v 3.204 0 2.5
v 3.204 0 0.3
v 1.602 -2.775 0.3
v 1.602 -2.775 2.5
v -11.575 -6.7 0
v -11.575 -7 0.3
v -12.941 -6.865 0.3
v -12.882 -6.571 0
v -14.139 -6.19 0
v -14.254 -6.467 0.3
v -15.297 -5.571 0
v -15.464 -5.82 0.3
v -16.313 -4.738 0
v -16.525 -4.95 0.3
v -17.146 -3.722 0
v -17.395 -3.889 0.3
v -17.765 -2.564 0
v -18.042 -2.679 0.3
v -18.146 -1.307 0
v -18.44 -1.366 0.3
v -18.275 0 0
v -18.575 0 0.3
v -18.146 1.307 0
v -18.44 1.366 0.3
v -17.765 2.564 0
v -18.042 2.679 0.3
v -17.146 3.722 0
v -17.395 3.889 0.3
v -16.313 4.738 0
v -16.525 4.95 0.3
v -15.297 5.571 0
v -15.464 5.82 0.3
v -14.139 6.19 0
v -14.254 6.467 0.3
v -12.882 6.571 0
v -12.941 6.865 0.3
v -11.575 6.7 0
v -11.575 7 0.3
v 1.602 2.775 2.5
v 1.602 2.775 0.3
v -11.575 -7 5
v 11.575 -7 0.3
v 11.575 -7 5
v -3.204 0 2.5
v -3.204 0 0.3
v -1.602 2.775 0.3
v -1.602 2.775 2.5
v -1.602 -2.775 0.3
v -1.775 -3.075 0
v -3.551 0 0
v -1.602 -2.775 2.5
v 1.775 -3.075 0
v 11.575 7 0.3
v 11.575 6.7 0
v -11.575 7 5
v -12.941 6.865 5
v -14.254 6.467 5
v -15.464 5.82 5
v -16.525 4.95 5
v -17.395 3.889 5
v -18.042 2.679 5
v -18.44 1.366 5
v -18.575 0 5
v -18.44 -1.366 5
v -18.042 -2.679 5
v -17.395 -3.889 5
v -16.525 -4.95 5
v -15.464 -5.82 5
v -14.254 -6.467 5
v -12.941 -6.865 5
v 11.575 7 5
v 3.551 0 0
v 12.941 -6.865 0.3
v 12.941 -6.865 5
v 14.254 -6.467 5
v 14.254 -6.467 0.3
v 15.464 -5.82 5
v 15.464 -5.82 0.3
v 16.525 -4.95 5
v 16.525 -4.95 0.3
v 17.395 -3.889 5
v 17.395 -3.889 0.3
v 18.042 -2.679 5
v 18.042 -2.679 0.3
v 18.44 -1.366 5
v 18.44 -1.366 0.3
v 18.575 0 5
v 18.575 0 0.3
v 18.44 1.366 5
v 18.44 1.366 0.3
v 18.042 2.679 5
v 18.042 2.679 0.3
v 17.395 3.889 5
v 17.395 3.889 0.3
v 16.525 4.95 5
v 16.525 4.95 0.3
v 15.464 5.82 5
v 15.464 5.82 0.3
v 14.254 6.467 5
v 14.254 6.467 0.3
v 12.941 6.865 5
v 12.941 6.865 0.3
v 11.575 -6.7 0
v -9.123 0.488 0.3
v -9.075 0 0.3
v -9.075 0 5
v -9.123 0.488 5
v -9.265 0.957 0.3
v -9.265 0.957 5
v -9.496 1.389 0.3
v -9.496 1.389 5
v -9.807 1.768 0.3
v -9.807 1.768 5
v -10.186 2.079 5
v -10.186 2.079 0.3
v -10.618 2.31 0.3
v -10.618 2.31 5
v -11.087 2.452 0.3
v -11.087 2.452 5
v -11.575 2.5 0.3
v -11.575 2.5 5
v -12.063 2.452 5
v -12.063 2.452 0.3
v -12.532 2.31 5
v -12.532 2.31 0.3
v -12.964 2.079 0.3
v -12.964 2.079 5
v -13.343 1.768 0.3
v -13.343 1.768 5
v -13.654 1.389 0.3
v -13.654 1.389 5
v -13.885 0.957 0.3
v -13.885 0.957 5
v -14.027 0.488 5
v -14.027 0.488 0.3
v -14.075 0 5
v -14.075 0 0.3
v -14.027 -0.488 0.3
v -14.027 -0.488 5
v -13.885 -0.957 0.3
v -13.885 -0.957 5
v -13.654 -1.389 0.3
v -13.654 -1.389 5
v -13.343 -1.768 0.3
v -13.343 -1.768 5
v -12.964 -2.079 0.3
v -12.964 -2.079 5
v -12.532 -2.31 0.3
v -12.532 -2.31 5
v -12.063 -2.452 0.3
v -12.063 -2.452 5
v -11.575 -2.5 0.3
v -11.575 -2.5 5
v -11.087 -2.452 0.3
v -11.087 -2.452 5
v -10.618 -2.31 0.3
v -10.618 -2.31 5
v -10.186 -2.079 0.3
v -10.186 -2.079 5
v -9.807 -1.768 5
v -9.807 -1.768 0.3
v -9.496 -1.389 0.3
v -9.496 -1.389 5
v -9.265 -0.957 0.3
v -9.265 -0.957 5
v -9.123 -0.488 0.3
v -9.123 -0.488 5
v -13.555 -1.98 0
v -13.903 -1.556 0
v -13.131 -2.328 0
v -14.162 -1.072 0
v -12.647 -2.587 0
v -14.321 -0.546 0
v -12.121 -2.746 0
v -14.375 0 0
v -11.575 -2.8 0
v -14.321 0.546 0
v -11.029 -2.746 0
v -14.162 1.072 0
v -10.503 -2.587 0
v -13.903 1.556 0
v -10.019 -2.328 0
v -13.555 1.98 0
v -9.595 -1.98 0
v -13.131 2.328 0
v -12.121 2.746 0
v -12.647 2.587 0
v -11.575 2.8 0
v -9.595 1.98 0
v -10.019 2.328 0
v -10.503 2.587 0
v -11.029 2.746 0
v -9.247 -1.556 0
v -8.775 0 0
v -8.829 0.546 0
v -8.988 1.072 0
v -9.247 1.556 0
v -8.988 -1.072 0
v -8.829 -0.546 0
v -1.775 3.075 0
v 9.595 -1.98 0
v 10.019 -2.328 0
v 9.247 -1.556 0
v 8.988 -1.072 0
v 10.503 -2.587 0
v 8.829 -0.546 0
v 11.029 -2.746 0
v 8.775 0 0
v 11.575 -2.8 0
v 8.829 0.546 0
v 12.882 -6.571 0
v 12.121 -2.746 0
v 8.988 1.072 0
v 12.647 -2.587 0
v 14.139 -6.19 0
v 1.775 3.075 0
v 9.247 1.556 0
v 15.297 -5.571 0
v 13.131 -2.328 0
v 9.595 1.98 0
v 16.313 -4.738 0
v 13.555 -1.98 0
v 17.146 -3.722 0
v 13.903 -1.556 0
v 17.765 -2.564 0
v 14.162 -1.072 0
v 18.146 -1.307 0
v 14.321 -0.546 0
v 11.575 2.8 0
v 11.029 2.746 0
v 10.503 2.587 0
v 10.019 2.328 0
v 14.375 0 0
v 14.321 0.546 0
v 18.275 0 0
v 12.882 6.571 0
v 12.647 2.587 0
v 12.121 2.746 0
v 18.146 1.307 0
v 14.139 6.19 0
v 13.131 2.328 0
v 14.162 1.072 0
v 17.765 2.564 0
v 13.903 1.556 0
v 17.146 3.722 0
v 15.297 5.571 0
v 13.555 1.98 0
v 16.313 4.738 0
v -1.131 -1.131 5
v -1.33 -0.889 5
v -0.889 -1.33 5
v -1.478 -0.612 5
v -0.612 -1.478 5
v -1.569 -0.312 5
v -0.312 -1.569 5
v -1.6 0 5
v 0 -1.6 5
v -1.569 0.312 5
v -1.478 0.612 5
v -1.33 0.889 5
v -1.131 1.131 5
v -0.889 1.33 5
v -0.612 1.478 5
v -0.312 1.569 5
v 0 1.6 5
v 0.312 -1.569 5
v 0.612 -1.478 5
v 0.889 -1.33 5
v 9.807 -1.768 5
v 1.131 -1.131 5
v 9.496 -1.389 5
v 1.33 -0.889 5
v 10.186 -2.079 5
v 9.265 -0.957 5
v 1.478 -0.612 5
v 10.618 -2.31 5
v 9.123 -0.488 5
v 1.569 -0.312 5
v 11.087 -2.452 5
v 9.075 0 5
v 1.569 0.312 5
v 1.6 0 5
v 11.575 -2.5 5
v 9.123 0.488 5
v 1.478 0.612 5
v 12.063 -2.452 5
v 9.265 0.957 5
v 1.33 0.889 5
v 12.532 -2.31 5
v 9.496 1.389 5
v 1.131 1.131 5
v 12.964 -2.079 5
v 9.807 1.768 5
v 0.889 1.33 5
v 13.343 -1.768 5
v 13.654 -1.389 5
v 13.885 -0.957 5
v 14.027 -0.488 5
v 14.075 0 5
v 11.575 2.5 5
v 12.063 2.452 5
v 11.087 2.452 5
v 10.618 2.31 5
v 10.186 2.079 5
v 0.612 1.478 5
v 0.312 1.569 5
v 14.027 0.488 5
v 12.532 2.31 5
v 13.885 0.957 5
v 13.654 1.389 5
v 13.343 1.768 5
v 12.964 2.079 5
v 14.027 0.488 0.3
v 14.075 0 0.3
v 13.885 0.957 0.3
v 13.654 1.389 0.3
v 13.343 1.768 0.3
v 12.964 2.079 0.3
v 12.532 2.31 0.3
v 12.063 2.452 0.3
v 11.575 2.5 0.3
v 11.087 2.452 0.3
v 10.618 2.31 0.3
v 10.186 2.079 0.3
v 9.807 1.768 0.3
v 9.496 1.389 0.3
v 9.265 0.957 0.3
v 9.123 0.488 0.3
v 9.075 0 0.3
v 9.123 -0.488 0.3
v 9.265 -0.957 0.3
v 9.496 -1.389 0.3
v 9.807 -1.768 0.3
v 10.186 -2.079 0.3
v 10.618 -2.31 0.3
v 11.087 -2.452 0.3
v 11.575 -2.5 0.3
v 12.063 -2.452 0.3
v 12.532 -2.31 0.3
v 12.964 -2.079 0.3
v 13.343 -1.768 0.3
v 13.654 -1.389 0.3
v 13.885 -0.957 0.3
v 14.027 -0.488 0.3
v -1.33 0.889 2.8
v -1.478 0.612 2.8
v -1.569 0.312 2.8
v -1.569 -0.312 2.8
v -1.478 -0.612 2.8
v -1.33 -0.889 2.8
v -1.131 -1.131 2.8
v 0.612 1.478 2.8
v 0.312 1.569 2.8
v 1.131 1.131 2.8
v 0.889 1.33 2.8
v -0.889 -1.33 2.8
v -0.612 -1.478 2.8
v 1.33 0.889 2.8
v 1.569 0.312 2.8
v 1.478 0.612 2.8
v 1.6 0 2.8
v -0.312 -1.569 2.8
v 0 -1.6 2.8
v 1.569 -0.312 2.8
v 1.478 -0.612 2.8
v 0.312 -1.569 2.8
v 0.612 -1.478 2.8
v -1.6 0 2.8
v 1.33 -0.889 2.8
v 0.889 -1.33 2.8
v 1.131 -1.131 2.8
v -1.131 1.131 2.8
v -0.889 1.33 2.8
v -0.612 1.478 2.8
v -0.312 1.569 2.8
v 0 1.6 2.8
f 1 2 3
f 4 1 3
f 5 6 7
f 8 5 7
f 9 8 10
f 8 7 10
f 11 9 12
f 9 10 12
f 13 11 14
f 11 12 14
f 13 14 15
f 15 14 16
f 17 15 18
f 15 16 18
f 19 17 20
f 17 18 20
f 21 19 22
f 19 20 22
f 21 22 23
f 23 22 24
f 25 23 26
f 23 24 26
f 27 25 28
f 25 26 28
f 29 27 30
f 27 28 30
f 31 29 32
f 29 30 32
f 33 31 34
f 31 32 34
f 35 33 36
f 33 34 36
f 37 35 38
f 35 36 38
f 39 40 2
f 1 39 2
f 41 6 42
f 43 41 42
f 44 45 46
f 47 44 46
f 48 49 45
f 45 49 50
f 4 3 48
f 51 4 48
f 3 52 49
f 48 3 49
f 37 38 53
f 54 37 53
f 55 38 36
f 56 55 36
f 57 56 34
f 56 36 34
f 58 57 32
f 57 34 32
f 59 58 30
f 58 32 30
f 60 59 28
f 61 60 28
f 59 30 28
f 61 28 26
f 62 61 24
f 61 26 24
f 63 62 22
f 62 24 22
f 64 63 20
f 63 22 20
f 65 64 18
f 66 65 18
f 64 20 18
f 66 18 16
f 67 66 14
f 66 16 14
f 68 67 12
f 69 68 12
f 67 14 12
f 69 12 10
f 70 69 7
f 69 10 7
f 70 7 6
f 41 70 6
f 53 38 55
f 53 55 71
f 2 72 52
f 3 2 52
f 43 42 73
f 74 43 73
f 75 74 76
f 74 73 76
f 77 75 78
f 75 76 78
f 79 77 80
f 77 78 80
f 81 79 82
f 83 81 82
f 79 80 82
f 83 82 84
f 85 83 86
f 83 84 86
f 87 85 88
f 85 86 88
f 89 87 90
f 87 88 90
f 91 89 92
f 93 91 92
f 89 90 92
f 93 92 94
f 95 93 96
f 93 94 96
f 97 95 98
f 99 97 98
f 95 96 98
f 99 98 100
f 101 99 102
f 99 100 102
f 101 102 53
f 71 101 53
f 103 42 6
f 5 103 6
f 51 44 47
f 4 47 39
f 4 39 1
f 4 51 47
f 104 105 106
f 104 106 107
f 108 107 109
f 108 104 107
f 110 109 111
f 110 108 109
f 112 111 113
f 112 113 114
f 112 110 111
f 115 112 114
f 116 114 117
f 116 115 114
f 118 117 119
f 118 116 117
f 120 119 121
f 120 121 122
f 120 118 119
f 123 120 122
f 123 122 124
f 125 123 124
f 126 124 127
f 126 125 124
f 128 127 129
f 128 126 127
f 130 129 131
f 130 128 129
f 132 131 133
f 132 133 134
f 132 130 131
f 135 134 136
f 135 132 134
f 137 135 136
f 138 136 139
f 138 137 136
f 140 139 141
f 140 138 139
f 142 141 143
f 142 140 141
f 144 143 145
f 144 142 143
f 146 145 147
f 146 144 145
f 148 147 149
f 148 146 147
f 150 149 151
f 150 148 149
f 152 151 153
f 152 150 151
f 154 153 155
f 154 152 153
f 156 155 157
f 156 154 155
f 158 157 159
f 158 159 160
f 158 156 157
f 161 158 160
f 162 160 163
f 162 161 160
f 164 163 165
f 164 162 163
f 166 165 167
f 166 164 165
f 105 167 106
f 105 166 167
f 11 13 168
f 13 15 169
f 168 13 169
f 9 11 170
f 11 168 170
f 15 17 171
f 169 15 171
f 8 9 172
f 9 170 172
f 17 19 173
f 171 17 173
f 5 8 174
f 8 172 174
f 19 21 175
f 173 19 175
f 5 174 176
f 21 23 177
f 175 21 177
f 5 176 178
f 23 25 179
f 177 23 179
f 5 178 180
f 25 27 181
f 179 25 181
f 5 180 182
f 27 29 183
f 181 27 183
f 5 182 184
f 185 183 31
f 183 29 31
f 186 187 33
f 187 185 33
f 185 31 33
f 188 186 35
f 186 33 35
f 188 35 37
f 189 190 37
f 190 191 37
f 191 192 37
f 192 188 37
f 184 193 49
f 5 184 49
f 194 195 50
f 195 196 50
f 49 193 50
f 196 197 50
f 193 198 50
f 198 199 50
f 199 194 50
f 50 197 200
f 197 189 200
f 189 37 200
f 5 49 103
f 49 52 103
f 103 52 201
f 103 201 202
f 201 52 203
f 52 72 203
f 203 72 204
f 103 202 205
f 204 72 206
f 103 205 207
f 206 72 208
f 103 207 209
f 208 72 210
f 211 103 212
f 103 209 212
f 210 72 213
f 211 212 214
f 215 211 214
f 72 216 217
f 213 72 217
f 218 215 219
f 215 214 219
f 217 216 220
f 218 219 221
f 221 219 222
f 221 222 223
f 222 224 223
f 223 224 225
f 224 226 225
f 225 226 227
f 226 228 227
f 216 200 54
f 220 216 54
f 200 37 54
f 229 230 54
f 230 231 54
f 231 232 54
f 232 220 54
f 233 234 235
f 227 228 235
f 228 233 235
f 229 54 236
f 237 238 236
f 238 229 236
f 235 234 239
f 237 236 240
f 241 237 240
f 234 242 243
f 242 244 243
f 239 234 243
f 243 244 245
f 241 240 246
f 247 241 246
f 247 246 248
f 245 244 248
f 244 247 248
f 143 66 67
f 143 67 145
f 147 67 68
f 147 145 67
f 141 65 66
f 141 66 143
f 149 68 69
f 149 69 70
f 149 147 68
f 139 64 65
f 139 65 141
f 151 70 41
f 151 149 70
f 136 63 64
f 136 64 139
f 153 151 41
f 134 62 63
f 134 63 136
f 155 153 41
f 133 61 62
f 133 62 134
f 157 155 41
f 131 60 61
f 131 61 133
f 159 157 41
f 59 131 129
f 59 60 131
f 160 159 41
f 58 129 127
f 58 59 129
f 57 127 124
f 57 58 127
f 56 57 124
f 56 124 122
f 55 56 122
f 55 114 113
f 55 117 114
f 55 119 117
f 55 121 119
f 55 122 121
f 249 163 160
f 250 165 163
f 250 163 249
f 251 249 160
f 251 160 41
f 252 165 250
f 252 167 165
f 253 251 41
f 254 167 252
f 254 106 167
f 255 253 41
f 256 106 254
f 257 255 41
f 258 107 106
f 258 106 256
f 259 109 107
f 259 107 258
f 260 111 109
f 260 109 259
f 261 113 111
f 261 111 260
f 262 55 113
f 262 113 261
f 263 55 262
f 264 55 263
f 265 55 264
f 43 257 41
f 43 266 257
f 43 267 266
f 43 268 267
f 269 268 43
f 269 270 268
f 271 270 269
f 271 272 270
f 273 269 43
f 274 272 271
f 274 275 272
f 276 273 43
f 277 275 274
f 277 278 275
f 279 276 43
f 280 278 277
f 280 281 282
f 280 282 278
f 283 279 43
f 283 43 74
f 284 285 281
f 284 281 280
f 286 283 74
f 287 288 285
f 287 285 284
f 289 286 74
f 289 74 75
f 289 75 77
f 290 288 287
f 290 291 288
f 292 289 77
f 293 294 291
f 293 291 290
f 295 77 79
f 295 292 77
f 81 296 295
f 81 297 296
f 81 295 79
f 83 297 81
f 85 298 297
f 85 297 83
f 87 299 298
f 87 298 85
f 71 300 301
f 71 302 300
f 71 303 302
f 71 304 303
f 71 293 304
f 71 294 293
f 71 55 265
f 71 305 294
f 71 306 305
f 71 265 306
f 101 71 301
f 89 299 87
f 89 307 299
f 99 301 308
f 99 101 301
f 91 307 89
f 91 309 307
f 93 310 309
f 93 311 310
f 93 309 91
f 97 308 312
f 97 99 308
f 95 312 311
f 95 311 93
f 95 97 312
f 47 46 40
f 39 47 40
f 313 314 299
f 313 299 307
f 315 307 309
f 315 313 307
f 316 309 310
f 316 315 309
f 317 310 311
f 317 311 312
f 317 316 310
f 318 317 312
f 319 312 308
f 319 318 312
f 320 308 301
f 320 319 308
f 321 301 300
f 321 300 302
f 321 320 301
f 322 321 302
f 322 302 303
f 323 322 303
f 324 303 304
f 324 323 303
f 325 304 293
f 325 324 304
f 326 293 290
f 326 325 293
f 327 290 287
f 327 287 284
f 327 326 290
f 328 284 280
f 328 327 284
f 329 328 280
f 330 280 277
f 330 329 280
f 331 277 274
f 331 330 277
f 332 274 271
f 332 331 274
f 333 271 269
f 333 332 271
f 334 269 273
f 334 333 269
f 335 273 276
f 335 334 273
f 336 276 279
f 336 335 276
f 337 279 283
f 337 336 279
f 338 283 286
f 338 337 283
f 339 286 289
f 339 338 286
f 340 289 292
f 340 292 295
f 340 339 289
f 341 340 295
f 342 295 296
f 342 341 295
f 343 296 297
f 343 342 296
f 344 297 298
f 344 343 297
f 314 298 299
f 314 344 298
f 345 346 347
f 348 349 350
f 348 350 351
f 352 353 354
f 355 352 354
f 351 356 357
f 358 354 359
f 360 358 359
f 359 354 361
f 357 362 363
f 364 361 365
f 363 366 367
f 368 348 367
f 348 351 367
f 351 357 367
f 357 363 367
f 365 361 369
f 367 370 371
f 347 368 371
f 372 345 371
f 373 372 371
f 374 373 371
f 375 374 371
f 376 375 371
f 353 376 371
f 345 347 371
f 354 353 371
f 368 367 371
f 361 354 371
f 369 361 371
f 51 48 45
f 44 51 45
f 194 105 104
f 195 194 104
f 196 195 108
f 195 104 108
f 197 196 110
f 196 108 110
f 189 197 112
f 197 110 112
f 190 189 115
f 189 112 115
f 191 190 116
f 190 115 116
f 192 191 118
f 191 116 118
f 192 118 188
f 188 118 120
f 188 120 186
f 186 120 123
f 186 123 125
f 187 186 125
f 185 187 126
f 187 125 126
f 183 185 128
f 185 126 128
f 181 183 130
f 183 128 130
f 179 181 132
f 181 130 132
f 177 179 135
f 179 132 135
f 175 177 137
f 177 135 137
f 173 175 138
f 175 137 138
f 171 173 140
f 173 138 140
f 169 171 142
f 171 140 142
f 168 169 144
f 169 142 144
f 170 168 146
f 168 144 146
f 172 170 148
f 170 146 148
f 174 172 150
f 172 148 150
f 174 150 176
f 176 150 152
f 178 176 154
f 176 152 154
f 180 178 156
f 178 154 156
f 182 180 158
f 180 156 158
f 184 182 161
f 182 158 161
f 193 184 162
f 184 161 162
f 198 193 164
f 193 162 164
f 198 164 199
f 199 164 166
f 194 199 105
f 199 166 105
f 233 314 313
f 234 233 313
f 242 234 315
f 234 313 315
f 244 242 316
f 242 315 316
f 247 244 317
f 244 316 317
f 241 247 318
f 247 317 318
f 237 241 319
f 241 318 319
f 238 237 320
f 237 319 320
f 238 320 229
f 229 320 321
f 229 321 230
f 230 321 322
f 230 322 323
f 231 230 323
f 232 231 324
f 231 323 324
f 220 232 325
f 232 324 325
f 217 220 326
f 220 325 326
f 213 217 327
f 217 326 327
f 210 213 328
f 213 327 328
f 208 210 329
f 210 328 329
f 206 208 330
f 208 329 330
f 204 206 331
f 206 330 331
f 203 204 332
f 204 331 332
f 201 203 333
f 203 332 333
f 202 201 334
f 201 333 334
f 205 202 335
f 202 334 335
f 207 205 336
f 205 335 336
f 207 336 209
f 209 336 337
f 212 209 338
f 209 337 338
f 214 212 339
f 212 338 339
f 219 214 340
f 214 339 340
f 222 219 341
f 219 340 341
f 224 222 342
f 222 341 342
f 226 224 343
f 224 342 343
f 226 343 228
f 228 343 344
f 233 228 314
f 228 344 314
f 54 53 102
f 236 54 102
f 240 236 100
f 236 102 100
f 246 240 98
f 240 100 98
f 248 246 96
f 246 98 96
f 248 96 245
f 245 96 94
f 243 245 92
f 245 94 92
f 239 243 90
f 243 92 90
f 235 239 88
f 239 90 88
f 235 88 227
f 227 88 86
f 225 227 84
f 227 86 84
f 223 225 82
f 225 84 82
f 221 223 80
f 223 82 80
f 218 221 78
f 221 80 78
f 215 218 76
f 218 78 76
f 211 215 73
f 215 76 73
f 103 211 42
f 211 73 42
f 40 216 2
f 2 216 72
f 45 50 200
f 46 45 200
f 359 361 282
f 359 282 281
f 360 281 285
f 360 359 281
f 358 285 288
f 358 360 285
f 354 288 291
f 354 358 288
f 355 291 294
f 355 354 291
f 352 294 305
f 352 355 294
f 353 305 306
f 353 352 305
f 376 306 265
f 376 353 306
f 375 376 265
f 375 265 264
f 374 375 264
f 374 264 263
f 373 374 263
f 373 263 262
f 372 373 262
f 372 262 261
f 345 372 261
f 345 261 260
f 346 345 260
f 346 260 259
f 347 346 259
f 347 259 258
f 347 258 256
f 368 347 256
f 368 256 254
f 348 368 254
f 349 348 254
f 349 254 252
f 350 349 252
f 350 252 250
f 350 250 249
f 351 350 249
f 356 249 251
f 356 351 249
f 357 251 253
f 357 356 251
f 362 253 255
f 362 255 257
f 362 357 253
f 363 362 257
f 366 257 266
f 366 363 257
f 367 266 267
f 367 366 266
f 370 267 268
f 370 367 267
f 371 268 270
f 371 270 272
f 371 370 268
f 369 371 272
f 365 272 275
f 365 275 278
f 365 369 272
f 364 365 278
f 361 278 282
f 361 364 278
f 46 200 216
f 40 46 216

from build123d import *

# Parameters (mm, degrees)
SKETCH_R        = 2.5
SKETCH_R_2      = 1.6
PAD_DEPTH       = 5
POCKET_DEPTH    = 2.5
SKETCH002_R     = 1.6
PAD001_DEPTH    = 0.3
CHAMFER_SIZE    = 0.3
CHAMFER001_SIZE = 0.3


with BuildPart() as part:
    # Sketch → Pad (new body)
    with BuildSketch(Plane.XY):
        with BuildLine():
            ThreePointArc((-11.575, 7), (-18.575, 0), (-11.575, -7))
            Line((-11.575, -7), (11.575, -7))
            ThreePointArc((11.575, -7), (18.575, 0), (11.575, 7))
            Line((-11.575, 7), (11.575, 7))
        make_face()
        with Locations((-11.575, 0)):
            Circle(SKETCH_R, mode=Mode.SUBTRACT)
        with Locations((11.575, 0)):
            Circle(SKETCH_R, mode=Mode.SUBTRACT)
        Circle(SKETCH_R_2, mode=Mode.SUBTRACT)
    extrude(amount=PAD_DEPTH)

    # Sketch001 → Pocket (cut)
    with BuildSketch(Plane(origin=(0, 0, 0), x_dir=(1, 0, 0), z_dir=(0, 0, -1))):
        Polygon((1.602147, 2.775), (-1.602147, 2.775), (-3.204294, 0), (-1.602147, -2.775), (1.602147, -2.775), (3.204294, 0), align=None)
    extrude(amount=-POCKET_DEPTH, mode=Mode.SUBTRACT)

    # Sketch002 → Pad001 (new body)
    with BuildSketch(Plane(origin=(0, 0, 2.5), x_dir=(1, 0, 0), z_dir=(0, 0, -1))):
        Circle(SKETCH002_R)
    extrude(amount=-PAD001_DEPTH)

    # Chamfer
    chamfer_edges = [part.edges().sort_by_distance(p)[0] for p in [
        (-14.075, 0, 0),
        (9.075, 0, 0),
        (2.40322, -1.3875, 0),
        (0, -2.775, 0),
        (-2.40322, -1.3875, 0),
        (-2.40322, 1.3875, 0),
        (0, 2.775, 0),
        (2.40322, 1.3875, 0),
    ]]
    chamfer(chamfer_edges, length=CHAMFER_SIZE)

    # Chamfer001
    chamfer001_edges = [part.edges().sort_by_distance(p)[0] for p in [
        (0, 7, 0),
    ]]
    chamfer(chamfer001_edges, length=CHAMFER001_SIZE)


solid = part.part
